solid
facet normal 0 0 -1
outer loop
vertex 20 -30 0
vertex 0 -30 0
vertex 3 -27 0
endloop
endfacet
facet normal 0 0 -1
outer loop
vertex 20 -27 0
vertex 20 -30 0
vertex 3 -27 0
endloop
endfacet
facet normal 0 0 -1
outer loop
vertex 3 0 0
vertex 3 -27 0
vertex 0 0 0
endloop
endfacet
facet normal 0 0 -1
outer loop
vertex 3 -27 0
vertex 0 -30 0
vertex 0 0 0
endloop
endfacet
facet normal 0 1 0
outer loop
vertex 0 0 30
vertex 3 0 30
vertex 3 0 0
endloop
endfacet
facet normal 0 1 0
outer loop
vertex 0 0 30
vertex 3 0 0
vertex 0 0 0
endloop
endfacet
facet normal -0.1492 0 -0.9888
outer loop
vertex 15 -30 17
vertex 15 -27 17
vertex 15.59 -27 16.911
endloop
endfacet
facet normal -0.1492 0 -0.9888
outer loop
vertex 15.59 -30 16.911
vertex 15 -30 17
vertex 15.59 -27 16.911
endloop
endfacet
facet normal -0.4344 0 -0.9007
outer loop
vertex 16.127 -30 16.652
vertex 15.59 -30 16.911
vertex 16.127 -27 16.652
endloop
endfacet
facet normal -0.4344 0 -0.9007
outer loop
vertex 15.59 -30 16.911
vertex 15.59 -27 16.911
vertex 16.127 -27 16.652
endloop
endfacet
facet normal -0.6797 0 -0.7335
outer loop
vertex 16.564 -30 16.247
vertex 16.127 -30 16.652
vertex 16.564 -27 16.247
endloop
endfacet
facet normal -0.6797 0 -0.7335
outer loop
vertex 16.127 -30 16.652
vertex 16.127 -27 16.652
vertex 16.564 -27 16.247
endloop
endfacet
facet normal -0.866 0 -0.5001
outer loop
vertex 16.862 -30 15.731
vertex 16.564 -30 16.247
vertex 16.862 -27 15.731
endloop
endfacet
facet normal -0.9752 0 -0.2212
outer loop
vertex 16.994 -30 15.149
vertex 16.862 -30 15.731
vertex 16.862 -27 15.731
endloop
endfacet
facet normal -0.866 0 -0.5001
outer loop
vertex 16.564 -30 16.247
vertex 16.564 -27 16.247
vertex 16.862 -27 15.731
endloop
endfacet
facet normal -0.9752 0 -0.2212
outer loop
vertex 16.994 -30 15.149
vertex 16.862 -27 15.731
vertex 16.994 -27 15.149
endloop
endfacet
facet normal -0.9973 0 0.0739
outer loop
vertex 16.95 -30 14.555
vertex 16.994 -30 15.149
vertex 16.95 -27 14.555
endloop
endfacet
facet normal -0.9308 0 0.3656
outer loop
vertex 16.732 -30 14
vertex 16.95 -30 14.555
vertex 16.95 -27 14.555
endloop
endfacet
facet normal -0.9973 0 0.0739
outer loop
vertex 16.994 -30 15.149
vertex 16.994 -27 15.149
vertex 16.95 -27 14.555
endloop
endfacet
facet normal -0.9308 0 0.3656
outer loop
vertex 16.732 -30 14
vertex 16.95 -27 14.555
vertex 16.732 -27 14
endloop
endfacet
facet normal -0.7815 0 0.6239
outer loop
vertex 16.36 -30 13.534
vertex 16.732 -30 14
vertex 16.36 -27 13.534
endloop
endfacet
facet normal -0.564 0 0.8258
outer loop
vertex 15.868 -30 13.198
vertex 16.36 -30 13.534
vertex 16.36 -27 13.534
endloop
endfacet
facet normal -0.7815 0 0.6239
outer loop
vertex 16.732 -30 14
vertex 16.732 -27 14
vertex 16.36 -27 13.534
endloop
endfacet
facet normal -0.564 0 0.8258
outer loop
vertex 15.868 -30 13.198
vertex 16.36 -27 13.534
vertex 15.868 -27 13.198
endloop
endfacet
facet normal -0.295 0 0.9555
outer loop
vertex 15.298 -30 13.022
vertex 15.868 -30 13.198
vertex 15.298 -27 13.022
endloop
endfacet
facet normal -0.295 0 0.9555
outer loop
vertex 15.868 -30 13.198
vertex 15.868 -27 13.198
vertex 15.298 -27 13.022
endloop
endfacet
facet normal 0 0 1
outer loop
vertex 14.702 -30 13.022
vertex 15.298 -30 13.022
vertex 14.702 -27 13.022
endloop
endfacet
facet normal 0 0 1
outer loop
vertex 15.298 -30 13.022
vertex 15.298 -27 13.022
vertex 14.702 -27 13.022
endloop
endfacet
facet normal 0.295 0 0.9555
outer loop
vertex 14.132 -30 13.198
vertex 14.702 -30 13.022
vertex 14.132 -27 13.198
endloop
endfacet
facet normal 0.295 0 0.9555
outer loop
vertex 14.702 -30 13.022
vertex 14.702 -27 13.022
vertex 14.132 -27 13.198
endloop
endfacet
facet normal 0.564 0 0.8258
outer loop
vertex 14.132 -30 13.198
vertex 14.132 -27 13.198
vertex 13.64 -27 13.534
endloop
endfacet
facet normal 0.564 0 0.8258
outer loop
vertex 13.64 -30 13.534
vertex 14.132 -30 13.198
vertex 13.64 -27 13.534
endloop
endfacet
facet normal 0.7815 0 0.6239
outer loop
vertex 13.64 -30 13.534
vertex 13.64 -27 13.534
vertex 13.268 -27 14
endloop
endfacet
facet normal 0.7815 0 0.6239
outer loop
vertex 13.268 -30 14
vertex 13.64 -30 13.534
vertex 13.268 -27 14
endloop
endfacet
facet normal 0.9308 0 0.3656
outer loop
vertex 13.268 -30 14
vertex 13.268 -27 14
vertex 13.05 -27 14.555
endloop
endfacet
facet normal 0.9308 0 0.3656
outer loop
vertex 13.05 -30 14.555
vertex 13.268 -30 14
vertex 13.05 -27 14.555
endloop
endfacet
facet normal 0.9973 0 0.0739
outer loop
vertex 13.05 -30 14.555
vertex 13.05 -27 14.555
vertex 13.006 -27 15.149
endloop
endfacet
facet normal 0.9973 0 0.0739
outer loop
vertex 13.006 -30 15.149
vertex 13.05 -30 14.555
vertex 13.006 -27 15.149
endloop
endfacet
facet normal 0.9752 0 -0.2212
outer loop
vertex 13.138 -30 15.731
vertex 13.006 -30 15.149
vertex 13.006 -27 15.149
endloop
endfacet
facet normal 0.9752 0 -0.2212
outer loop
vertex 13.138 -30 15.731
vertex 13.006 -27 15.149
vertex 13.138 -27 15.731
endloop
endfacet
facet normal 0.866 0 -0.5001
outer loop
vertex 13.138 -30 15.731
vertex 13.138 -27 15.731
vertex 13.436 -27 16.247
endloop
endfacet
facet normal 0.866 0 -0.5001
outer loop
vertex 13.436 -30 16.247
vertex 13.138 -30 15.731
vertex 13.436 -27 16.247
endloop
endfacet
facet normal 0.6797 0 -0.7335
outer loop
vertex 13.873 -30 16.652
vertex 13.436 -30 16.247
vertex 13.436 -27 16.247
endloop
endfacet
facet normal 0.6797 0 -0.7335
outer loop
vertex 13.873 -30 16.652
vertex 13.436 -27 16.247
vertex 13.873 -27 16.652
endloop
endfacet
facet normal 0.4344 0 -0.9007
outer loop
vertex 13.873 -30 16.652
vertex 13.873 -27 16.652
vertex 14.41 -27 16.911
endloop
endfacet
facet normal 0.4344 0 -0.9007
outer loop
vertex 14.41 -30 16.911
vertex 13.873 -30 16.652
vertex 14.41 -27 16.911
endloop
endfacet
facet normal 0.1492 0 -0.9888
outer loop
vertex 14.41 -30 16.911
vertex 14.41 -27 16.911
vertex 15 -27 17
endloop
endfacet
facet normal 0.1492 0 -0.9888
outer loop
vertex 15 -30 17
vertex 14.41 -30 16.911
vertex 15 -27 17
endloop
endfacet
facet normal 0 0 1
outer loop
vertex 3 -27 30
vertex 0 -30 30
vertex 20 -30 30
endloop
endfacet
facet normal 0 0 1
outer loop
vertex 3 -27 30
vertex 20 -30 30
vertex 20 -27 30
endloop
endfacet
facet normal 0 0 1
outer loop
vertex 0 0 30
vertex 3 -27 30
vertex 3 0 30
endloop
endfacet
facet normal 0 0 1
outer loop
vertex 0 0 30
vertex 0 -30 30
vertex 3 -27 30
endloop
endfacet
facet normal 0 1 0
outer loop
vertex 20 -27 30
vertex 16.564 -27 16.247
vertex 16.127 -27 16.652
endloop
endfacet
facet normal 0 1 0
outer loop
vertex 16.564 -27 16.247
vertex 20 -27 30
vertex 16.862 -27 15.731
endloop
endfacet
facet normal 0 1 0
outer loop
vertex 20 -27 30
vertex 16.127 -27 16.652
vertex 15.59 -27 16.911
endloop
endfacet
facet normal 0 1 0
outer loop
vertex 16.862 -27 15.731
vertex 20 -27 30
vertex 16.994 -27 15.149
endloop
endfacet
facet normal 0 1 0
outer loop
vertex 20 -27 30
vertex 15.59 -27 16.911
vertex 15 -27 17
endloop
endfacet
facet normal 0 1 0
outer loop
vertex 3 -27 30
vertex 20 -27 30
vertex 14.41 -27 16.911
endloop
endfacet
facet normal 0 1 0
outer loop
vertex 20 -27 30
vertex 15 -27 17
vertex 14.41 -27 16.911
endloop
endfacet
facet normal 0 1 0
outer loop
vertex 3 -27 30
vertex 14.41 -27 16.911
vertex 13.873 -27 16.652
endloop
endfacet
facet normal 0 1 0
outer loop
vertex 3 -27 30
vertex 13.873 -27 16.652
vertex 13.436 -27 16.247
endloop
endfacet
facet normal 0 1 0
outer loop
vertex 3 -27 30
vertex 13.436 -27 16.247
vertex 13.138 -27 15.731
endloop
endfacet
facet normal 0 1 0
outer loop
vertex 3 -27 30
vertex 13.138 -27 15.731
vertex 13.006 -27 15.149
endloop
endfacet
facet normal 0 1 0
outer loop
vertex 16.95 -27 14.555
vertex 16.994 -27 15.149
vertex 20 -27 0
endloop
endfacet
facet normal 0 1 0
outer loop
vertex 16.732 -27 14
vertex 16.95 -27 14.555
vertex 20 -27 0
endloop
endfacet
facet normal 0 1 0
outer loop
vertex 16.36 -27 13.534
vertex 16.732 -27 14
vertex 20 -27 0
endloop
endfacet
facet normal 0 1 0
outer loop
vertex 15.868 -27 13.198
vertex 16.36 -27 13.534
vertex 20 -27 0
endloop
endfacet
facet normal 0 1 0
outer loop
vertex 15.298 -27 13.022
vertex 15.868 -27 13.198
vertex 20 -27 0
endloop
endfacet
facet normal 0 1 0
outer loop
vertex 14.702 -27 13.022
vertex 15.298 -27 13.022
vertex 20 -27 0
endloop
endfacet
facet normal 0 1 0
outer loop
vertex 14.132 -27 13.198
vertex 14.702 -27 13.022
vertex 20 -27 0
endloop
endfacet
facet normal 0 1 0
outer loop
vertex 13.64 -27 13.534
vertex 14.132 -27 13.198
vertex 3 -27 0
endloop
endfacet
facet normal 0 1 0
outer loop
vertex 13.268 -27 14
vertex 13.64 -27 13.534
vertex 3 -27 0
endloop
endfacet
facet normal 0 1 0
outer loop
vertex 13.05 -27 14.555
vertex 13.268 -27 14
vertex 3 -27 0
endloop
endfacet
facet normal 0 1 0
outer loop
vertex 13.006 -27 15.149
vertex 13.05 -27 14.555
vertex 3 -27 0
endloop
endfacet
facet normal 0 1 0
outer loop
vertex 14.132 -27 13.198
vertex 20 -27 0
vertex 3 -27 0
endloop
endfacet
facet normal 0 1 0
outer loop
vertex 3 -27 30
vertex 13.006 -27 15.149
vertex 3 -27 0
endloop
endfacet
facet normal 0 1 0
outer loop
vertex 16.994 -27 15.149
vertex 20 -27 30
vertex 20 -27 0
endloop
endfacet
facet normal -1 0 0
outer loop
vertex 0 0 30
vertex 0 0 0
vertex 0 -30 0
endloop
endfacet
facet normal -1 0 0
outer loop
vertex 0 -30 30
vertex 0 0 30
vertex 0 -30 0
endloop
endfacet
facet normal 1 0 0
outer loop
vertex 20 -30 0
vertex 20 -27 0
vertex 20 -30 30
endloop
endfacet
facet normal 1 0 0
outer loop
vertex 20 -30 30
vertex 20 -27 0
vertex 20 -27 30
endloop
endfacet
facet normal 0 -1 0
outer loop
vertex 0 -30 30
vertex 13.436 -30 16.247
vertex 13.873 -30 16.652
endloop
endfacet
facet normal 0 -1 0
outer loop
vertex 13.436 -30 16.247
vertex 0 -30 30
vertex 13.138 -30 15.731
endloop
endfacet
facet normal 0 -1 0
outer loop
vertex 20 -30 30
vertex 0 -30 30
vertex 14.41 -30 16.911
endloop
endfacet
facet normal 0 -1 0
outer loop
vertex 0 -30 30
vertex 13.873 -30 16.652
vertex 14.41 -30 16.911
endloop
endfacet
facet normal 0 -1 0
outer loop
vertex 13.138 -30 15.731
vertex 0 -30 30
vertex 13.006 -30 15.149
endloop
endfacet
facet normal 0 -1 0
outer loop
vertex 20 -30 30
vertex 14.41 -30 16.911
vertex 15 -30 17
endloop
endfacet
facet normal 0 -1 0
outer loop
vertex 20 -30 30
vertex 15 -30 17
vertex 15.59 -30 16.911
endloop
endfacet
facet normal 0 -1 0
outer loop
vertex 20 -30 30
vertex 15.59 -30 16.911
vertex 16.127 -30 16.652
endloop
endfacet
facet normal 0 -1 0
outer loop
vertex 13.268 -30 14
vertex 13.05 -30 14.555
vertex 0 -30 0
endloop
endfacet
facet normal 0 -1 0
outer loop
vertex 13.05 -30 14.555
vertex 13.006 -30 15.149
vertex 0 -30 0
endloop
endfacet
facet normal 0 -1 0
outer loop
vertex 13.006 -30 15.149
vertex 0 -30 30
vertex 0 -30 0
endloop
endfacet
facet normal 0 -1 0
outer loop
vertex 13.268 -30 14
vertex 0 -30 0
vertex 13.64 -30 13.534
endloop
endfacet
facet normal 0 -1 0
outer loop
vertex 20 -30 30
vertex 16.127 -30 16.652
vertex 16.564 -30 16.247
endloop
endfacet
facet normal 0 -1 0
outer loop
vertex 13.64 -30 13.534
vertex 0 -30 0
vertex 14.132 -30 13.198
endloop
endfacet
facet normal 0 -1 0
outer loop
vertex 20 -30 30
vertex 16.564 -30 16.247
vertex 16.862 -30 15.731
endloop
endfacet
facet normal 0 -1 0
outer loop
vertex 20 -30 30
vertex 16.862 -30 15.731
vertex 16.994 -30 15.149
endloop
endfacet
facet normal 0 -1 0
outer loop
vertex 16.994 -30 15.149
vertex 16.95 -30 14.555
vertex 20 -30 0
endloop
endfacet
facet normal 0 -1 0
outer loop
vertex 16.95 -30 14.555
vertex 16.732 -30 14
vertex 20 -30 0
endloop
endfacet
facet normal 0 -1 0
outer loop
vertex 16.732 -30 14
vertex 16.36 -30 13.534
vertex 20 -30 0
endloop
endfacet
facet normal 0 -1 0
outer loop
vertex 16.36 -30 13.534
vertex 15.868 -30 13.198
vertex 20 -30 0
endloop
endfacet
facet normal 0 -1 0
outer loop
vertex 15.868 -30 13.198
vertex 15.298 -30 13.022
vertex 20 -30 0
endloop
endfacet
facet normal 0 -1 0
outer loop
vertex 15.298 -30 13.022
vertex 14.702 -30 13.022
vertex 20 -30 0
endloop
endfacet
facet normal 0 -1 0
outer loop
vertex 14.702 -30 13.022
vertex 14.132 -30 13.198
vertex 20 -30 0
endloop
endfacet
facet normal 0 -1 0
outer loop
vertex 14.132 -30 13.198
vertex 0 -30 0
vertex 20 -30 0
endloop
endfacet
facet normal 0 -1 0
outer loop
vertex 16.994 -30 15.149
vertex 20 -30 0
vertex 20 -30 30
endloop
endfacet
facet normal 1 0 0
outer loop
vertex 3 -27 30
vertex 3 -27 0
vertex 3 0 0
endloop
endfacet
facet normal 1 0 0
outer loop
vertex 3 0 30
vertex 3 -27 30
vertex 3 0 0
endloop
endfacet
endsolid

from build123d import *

# Parameters (mm, degrees)
BOSS_EXTRUDE1_DEPTH = 30
SKETCH2_R           = 2
CUT_EXTRUDE1_DEPTH  = 30
SKETCH3_W           = 10
SKETCH3_H           = 30
CUT_EXTRUDE2_DEPTH  = 6


with BuildPart() as part:
    # Sketch1 → Boss-Extrude1 (new body)
    with BuildSketch(Plane(origin=(0, 0, 0), x_dir=(0, 1, 0), z_dir=(0, 0, 1))):
        Polygon((0, 0), (-30, 0), (-30, -30), (-27, -30), (-27, -3), (0, -3), align=None)
    extrude(amount=BOSS_EXTRUDE1_DEPTH)

    # Sketch2 → Cut-Extrude1 (cut)
    with BuildSketch(Plane(origin=(0, -27, 0), x_dir=(-1, 0, 0), z_dir=(0, 1, 0))):
        with Locations(Location((-15, 15, 0), (0, 0, 90))):
            Circle(SKETCH2_R)
    extrude(amount=-CUT_EXTRUDE1_DEPTH, mode=Mode.SUBTRACT)

    # Sketch3 → Cut-Extrude2 (cut)
    with BuildSketch(Plane(origin=(0, -27, 0), x_dir=(-1, 0, 0), z_dir=(0, 1, 0))):
        with Locations((-25, 15)):
            Rectangle(SKETCH3_W, SKETCH3_H)
    extrude(amount=-CUT_EXTRUDE2_DEPTH, mode=Mode.SUBTRACT)


solid = part.part
